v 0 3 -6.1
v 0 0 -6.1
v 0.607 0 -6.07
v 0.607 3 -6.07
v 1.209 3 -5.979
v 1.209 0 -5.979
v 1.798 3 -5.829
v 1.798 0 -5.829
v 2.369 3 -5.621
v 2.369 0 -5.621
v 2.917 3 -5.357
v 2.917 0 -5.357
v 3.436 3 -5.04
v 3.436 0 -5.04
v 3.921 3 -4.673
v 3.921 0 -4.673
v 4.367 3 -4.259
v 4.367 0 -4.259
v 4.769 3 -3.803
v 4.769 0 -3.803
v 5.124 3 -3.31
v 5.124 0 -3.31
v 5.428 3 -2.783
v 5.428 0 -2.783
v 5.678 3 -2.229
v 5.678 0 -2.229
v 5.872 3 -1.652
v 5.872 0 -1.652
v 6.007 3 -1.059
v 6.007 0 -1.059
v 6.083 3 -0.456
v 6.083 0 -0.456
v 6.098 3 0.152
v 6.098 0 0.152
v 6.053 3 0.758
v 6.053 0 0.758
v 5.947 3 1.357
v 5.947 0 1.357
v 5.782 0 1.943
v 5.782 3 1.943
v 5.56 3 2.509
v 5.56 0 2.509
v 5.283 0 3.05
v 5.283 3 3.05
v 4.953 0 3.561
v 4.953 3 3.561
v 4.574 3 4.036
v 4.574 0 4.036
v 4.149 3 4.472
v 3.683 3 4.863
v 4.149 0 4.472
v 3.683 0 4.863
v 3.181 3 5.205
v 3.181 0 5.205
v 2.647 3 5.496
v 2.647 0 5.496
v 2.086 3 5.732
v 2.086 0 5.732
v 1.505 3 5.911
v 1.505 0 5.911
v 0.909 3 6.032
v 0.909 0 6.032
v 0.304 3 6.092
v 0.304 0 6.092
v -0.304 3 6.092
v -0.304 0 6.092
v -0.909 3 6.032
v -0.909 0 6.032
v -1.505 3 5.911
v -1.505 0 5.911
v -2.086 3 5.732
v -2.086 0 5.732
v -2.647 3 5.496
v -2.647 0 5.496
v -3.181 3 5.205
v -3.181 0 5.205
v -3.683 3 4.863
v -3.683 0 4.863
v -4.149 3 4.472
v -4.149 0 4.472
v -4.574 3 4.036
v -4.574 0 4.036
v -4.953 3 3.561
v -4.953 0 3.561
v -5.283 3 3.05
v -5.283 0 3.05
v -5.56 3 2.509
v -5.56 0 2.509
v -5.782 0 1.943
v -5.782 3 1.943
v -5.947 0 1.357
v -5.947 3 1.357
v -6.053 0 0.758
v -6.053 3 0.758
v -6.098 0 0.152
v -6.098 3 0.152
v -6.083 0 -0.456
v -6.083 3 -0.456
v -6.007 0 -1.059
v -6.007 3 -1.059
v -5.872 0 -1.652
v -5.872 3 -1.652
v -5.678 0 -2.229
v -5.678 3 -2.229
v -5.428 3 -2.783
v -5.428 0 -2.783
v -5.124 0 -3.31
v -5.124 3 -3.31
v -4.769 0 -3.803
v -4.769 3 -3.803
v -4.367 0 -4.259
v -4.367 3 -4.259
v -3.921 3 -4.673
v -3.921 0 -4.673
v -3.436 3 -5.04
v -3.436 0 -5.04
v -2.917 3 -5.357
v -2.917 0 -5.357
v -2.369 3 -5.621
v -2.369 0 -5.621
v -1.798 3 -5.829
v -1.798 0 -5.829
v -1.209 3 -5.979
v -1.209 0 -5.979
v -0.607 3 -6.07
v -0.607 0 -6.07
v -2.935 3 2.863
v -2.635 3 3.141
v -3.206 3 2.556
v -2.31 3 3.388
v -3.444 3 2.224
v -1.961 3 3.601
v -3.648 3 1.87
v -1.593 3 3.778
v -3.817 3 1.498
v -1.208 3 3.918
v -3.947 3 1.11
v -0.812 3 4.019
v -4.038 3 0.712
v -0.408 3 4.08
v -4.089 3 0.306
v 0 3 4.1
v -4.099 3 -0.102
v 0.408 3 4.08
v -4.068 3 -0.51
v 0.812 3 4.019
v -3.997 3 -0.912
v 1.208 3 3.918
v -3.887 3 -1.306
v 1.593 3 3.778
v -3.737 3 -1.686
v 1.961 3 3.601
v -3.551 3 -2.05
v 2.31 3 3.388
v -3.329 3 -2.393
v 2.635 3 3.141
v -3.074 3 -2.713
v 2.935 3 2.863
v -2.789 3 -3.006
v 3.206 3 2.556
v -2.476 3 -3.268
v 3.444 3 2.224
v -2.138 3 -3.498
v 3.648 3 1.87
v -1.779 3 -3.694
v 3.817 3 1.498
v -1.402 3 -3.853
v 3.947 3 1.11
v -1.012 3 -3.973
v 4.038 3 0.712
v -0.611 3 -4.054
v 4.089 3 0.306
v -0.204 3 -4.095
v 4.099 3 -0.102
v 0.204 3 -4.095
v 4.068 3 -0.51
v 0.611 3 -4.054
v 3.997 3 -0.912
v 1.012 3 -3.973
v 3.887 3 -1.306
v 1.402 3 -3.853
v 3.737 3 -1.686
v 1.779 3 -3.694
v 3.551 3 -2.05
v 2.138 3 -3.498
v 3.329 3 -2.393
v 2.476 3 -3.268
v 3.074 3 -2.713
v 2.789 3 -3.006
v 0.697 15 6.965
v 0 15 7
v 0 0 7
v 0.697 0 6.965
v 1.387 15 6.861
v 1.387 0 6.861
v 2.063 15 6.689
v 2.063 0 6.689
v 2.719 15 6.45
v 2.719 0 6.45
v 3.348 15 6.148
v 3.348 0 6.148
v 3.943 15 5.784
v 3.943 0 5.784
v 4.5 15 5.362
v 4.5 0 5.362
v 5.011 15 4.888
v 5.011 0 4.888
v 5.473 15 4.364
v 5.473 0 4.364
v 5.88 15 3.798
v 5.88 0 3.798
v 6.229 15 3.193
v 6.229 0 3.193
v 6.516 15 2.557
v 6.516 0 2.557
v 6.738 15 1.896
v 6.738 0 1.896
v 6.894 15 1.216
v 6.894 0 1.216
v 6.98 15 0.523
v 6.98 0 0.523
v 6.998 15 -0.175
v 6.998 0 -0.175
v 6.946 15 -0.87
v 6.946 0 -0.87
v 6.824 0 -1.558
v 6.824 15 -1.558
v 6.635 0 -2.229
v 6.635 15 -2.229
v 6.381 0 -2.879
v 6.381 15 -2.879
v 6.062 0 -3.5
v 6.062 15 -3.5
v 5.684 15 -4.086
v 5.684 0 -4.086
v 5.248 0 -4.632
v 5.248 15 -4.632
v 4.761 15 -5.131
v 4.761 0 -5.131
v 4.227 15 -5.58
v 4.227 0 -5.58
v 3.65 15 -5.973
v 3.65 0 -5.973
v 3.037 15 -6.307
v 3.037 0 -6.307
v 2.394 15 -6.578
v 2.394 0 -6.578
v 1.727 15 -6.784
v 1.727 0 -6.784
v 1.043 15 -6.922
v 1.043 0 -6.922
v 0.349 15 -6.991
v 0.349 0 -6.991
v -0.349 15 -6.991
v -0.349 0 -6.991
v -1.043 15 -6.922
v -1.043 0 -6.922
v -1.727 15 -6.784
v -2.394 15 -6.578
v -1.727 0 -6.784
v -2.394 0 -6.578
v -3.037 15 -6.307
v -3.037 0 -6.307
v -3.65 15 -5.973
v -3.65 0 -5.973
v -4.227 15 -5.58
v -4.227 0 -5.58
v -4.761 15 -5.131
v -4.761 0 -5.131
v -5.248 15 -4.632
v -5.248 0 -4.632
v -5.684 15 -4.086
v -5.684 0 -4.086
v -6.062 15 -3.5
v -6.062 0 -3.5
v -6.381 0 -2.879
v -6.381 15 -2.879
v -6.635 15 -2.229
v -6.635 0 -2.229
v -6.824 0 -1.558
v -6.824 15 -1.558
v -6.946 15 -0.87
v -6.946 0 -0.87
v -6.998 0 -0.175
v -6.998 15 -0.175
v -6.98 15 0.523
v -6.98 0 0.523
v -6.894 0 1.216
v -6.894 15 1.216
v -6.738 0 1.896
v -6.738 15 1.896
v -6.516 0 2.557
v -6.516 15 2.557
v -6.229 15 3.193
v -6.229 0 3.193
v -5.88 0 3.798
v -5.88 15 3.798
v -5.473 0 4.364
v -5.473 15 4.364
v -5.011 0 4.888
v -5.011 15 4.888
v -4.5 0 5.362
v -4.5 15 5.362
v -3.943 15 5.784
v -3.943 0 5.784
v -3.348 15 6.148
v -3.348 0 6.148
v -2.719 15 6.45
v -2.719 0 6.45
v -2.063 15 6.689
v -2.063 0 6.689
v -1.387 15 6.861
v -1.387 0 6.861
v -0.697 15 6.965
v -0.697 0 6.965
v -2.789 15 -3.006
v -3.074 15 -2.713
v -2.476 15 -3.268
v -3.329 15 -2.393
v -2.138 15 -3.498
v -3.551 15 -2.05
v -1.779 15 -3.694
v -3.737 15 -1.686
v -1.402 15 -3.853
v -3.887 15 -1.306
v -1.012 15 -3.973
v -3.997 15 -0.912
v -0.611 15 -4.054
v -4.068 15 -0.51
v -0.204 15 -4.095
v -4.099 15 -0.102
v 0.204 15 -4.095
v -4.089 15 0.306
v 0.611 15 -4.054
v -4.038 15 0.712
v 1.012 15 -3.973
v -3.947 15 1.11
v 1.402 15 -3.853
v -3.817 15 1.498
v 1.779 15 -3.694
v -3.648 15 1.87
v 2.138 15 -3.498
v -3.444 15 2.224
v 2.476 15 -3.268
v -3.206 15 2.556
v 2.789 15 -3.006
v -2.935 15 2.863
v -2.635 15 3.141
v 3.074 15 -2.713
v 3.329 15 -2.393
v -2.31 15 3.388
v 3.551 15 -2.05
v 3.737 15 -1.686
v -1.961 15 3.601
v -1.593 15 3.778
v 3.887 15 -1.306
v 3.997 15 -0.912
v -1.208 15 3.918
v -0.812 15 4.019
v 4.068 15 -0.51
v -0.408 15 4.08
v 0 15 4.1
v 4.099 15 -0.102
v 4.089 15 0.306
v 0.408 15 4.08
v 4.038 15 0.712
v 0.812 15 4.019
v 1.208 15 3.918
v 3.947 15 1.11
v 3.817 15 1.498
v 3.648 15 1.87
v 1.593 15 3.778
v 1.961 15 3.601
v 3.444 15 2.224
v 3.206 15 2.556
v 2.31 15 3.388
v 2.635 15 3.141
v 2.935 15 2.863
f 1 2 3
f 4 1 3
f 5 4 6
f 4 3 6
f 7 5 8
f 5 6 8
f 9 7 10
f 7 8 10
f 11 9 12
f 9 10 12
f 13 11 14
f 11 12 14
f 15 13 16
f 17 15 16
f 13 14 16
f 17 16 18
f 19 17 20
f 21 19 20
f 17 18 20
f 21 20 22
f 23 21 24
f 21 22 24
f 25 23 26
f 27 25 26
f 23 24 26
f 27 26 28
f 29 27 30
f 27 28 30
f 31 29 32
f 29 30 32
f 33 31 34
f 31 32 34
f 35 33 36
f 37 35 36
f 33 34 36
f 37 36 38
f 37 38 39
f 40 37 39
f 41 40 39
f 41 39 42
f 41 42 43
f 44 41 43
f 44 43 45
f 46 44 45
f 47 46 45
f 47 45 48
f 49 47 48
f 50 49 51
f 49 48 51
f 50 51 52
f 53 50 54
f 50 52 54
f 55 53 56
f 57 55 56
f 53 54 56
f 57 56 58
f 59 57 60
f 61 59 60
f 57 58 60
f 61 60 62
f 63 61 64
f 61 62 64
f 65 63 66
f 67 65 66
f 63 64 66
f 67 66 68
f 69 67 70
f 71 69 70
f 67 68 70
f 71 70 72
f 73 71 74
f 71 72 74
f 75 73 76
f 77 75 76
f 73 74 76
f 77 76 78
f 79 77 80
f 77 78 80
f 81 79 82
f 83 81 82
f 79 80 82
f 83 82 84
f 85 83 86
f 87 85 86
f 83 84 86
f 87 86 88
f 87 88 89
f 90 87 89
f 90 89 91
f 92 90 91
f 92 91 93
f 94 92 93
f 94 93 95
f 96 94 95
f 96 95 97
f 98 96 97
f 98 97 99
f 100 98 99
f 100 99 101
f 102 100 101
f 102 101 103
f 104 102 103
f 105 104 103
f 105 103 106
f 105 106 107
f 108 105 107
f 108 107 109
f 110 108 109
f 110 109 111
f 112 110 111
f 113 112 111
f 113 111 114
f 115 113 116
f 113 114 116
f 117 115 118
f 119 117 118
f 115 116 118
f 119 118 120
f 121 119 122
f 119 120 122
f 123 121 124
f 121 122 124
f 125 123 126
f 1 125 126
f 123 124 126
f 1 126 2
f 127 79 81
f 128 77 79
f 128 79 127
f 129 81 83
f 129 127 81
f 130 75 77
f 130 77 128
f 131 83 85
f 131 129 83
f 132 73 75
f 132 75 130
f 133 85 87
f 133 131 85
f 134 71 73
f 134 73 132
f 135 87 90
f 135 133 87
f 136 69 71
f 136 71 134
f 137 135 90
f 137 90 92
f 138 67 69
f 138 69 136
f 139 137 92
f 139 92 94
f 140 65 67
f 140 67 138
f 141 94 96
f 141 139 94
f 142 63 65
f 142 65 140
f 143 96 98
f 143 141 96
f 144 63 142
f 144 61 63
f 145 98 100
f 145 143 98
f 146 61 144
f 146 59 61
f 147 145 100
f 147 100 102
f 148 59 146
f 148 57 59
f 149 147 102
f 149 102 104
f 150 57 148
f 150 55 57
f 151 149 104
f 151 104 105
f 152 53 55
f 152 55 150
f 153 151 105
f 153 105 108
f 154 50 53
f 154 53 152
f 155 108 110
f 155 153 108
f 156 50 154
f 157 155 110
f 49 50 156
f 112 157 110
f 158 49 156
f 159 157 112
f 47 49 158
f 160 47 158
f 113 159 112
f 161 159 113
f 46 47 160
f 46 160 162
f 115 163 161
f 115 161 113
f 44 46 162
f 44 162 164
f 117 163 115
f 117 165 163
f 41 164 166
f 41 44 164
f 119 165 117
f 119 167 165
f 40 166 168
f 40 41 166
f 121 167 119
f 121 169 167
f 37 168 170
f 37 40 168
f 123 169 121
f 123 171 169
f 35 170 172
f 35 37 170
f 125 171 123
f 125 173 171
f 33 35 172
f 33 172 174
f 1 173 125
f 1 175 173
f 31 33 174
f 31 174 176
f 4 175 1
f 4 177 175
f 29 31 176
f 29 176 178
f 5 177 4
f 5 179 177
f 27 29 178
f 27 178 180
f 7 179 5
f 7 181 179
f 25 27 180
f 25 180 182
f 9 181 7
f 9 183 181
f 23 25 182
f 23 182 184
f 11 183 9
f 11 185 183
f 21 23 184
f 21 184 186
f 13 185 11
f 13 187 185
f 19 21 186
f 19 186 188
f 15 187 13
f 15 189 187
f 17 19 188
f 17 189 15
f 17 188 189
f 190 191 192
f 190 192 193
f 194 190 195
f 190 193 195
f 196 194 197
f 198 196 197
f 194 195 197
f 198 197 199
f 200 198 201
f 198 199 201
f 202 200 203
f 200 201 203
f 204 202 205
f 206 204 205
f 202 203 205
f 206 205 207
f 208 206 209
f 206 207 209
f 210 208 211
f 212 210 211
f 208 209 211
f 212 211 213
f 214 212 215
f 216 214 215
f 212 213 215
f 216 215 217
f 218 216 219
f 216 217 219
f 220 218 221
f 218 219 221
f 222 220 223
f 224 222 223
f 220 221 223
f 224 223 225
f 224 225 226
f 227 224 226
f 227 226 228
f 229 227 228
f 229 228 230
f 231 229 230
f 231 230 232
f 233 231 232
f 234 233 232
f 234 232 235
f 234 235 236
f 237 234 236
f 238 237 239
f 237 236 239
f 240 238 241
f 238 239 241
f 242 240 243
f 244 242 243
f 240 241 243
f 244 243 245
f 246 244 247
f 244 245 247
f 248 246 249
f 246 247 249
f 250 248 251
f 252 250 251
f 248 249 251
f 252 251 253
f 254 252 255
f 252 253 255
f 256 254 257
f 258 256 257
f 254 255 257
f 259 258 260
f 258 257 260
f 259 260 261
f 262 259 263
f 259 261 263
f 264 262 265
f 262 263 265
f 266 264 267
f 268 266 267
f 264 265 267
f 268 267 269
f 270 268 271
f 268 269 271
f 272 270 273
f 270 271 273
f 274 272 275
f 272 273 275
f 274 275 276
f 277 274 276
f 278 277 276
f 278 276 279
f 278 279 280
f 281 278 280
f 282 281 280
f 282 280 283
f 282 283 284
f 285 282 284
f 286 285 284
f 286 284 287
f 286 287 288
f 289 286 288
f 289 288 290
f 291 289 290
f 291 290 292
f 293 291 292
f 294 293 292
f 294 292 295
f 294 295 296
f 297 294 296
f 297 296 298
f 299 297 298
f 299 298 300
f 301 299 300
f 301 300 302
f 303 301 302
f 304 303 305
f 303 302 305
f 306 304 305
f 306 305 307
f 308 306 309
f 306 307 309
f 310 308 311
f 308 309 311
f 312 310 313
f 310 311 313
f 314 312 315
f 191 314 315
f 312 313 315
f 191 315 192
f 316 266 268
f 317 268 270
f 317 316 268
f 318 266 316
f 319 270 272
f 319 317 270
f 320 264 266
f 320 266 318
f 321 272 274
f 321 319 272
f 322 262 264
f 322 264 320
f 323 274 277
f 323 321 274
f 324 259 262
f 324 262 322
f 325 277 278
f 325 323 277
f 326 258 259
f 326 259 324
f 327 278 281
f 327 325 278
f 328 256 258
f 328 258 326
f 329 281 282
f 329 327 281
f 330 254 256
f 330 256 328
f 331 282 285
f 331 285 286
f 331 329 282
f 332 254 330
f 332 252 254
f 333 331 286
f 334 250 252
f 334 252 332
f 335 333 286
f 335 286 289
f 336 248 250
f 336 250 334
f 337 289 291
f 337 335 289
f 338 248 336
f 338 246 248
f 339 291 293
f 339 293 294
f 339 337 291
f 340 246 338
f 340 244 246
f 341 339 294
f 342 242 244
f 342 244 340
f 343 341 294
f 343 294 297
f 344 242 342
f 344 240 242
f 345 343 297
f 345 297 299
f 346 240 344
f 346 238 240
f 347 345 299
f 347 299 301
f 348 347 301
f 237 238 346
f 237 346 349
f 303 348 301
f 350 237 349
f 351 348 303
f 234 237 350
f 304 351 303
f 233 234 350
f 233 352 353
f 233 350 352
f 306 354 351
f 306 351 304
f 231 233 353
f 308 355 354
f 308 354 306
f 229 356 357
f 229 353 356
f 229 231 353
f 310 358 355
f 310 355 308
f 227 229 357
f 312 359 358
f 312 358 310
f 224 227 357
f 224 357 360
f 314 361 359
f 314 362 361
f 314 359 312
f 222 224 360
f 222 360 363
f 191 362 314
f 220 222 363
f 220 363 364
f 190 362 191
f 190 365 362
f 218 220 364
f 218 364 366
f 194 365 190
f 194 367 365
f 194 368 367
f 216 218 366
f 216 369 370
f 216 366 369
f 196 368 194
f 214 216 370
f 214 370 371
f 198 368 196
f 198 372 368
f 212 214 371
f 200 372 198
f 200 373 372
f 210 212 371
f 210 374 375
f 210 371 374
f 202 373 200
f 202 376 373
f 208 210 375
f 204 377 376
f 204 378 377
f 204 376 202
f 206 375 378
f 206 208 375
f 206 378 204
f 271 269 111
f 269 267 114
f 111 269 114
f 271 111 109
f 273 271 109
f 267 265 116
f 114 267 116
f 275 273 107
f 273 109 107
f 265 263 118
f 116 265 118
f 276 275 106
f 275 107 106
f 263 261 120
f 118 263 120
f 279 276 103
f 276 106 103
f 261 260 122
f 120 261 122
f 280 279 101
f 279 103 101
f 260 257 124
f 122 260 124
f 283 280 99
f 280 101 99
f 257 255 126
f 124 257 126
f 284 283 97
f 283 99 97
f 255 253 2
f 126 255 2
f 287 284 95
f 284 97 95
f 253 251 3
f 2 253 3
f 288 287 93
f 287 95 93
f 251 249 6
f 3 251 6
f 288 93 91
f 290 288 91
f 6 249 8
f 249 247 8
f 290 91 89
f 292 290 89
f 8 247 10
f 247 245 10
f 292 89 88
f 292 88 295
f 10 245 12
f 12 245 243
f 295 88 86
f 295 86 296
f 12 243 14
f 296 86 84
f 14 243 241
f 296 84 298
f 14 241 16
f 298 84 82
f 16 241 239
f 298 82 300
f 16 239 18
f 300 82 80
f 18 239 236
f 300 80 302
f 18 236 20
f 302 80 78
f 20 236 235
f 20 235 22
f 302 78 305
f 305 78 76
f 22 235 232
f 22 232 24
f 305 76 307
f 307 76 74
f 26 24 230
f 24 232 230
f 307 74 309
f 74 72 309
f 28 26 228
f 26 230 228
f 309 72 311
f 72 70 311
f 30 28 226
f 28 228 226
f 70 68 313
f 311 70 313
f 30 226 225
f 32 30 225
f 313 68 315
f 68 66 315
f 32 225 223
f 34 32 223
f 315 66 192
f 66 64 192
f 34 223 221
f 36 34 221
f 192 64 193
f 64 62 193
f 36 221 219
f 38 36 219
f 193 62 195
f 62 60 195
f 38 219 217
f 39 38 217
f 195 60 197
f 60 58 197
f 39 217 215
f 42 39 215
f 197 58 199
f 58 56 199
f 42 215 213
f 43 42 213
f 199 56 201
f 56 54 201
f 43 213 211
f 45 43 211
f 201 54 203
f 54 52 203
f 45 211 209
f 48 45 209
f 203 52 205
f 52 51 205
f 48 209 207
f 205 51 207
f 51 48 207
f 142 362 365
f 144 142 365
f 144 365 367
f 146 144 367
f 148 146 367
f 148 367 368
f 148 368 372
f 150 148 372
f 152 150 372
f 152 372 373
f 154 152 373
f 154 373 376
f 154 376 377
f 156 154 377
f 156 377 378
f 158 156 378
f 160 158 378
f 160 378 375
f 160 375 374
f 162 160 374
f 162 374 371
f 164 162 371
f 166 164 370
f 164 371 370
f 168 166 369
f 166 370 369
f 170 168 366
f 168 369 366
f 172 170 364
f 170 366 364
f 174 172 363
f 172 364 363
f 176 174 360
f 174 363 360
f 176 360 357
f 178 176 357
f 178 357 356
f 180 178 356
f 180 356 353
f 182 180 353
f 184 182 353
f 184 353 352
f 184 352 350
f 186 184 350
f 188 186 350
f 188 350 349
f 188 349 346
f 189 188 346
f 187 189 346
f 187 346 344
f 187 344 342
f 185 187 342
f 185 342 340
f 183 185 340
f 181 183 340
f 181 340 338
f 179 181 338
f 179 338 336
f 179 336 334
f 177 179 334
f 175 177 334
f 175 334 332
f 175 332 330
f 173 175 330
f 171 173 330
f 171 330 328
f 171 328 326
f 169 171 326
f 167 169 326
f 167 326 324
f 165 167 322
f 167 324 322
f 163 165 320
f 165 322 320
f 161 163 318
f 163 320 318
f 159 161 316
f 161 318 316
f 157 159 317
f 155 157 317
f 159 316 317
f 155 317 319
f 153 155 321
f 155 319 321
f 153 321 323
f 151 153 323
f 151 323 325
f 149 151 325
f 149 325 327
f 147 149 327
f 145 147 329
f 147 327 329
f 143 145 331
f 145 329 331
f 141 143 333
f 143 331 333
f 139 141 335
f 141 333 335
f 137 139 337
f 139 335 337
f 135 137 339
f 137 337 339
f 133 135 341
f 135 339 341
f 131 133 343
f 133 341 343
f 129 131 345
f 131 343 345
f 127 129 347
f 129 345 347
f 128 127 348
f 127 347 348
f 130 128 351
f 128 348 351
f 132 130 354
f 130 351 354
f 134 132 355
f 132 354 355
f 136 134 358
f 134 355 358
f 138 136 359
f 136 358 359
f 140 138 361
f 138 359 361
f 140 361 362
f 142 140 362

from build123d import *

# Parameters (mm, degrees)
SKETCH1_R           = 7
BOSS_EXTRUDE3_DEPTH = 15
SKETCH4_R           = 4.1
CUT_EXTRUDE1_DEPTH  = 16
SKETCH5_R           = 6.1
CUT_EXTRUDE2_DEPTH  = 3


with BuildPart() as part:
    # Sketch1 → Boss-Extrude3 (new body)
    with BuildSketch(Plane(origin=(0, 0, 0), x_dir=(1, 0, 0), z_dir=(0, 1, 0))):
        with Locations(Location((0, 0, 0), (0, 0, 270))):  # turned: the seam where the file's is
            Circle(SKETCH1_R)
    extrude(amount=BOSS_EXTRUDE3_DEPTH)

    # Sketch4 → Cut-Extrude1 (cut, through all)
    with BuildSketch(Plane(origin=(0, 15, 0), x_dir=(1, 0, 0), z_dir=(0, 1, 0))):
        with Locations(Location((0, 0, 0), (0, 0, 270))):  # turned: the seam where the file's is
            Circle(SKETCH4_R)
    extrude(amount=-CUT_EXTRUDE1_DEPTH, mode=Mode.SUBTRACT)

    # Sketch5 → Cut-Extrude2 (cut)
    with BuildSketch(Plane.XZ):
        with Locations(Location((0, 0, 0), (0, 0, 270))):  # turned: the seam where the file's is
            Circle(SKETCH5_R)
    extrude(amount=-CUT_EXTRUDE2_DEPTH, mode=Mode.SUBTRACT)


solid = part.part
